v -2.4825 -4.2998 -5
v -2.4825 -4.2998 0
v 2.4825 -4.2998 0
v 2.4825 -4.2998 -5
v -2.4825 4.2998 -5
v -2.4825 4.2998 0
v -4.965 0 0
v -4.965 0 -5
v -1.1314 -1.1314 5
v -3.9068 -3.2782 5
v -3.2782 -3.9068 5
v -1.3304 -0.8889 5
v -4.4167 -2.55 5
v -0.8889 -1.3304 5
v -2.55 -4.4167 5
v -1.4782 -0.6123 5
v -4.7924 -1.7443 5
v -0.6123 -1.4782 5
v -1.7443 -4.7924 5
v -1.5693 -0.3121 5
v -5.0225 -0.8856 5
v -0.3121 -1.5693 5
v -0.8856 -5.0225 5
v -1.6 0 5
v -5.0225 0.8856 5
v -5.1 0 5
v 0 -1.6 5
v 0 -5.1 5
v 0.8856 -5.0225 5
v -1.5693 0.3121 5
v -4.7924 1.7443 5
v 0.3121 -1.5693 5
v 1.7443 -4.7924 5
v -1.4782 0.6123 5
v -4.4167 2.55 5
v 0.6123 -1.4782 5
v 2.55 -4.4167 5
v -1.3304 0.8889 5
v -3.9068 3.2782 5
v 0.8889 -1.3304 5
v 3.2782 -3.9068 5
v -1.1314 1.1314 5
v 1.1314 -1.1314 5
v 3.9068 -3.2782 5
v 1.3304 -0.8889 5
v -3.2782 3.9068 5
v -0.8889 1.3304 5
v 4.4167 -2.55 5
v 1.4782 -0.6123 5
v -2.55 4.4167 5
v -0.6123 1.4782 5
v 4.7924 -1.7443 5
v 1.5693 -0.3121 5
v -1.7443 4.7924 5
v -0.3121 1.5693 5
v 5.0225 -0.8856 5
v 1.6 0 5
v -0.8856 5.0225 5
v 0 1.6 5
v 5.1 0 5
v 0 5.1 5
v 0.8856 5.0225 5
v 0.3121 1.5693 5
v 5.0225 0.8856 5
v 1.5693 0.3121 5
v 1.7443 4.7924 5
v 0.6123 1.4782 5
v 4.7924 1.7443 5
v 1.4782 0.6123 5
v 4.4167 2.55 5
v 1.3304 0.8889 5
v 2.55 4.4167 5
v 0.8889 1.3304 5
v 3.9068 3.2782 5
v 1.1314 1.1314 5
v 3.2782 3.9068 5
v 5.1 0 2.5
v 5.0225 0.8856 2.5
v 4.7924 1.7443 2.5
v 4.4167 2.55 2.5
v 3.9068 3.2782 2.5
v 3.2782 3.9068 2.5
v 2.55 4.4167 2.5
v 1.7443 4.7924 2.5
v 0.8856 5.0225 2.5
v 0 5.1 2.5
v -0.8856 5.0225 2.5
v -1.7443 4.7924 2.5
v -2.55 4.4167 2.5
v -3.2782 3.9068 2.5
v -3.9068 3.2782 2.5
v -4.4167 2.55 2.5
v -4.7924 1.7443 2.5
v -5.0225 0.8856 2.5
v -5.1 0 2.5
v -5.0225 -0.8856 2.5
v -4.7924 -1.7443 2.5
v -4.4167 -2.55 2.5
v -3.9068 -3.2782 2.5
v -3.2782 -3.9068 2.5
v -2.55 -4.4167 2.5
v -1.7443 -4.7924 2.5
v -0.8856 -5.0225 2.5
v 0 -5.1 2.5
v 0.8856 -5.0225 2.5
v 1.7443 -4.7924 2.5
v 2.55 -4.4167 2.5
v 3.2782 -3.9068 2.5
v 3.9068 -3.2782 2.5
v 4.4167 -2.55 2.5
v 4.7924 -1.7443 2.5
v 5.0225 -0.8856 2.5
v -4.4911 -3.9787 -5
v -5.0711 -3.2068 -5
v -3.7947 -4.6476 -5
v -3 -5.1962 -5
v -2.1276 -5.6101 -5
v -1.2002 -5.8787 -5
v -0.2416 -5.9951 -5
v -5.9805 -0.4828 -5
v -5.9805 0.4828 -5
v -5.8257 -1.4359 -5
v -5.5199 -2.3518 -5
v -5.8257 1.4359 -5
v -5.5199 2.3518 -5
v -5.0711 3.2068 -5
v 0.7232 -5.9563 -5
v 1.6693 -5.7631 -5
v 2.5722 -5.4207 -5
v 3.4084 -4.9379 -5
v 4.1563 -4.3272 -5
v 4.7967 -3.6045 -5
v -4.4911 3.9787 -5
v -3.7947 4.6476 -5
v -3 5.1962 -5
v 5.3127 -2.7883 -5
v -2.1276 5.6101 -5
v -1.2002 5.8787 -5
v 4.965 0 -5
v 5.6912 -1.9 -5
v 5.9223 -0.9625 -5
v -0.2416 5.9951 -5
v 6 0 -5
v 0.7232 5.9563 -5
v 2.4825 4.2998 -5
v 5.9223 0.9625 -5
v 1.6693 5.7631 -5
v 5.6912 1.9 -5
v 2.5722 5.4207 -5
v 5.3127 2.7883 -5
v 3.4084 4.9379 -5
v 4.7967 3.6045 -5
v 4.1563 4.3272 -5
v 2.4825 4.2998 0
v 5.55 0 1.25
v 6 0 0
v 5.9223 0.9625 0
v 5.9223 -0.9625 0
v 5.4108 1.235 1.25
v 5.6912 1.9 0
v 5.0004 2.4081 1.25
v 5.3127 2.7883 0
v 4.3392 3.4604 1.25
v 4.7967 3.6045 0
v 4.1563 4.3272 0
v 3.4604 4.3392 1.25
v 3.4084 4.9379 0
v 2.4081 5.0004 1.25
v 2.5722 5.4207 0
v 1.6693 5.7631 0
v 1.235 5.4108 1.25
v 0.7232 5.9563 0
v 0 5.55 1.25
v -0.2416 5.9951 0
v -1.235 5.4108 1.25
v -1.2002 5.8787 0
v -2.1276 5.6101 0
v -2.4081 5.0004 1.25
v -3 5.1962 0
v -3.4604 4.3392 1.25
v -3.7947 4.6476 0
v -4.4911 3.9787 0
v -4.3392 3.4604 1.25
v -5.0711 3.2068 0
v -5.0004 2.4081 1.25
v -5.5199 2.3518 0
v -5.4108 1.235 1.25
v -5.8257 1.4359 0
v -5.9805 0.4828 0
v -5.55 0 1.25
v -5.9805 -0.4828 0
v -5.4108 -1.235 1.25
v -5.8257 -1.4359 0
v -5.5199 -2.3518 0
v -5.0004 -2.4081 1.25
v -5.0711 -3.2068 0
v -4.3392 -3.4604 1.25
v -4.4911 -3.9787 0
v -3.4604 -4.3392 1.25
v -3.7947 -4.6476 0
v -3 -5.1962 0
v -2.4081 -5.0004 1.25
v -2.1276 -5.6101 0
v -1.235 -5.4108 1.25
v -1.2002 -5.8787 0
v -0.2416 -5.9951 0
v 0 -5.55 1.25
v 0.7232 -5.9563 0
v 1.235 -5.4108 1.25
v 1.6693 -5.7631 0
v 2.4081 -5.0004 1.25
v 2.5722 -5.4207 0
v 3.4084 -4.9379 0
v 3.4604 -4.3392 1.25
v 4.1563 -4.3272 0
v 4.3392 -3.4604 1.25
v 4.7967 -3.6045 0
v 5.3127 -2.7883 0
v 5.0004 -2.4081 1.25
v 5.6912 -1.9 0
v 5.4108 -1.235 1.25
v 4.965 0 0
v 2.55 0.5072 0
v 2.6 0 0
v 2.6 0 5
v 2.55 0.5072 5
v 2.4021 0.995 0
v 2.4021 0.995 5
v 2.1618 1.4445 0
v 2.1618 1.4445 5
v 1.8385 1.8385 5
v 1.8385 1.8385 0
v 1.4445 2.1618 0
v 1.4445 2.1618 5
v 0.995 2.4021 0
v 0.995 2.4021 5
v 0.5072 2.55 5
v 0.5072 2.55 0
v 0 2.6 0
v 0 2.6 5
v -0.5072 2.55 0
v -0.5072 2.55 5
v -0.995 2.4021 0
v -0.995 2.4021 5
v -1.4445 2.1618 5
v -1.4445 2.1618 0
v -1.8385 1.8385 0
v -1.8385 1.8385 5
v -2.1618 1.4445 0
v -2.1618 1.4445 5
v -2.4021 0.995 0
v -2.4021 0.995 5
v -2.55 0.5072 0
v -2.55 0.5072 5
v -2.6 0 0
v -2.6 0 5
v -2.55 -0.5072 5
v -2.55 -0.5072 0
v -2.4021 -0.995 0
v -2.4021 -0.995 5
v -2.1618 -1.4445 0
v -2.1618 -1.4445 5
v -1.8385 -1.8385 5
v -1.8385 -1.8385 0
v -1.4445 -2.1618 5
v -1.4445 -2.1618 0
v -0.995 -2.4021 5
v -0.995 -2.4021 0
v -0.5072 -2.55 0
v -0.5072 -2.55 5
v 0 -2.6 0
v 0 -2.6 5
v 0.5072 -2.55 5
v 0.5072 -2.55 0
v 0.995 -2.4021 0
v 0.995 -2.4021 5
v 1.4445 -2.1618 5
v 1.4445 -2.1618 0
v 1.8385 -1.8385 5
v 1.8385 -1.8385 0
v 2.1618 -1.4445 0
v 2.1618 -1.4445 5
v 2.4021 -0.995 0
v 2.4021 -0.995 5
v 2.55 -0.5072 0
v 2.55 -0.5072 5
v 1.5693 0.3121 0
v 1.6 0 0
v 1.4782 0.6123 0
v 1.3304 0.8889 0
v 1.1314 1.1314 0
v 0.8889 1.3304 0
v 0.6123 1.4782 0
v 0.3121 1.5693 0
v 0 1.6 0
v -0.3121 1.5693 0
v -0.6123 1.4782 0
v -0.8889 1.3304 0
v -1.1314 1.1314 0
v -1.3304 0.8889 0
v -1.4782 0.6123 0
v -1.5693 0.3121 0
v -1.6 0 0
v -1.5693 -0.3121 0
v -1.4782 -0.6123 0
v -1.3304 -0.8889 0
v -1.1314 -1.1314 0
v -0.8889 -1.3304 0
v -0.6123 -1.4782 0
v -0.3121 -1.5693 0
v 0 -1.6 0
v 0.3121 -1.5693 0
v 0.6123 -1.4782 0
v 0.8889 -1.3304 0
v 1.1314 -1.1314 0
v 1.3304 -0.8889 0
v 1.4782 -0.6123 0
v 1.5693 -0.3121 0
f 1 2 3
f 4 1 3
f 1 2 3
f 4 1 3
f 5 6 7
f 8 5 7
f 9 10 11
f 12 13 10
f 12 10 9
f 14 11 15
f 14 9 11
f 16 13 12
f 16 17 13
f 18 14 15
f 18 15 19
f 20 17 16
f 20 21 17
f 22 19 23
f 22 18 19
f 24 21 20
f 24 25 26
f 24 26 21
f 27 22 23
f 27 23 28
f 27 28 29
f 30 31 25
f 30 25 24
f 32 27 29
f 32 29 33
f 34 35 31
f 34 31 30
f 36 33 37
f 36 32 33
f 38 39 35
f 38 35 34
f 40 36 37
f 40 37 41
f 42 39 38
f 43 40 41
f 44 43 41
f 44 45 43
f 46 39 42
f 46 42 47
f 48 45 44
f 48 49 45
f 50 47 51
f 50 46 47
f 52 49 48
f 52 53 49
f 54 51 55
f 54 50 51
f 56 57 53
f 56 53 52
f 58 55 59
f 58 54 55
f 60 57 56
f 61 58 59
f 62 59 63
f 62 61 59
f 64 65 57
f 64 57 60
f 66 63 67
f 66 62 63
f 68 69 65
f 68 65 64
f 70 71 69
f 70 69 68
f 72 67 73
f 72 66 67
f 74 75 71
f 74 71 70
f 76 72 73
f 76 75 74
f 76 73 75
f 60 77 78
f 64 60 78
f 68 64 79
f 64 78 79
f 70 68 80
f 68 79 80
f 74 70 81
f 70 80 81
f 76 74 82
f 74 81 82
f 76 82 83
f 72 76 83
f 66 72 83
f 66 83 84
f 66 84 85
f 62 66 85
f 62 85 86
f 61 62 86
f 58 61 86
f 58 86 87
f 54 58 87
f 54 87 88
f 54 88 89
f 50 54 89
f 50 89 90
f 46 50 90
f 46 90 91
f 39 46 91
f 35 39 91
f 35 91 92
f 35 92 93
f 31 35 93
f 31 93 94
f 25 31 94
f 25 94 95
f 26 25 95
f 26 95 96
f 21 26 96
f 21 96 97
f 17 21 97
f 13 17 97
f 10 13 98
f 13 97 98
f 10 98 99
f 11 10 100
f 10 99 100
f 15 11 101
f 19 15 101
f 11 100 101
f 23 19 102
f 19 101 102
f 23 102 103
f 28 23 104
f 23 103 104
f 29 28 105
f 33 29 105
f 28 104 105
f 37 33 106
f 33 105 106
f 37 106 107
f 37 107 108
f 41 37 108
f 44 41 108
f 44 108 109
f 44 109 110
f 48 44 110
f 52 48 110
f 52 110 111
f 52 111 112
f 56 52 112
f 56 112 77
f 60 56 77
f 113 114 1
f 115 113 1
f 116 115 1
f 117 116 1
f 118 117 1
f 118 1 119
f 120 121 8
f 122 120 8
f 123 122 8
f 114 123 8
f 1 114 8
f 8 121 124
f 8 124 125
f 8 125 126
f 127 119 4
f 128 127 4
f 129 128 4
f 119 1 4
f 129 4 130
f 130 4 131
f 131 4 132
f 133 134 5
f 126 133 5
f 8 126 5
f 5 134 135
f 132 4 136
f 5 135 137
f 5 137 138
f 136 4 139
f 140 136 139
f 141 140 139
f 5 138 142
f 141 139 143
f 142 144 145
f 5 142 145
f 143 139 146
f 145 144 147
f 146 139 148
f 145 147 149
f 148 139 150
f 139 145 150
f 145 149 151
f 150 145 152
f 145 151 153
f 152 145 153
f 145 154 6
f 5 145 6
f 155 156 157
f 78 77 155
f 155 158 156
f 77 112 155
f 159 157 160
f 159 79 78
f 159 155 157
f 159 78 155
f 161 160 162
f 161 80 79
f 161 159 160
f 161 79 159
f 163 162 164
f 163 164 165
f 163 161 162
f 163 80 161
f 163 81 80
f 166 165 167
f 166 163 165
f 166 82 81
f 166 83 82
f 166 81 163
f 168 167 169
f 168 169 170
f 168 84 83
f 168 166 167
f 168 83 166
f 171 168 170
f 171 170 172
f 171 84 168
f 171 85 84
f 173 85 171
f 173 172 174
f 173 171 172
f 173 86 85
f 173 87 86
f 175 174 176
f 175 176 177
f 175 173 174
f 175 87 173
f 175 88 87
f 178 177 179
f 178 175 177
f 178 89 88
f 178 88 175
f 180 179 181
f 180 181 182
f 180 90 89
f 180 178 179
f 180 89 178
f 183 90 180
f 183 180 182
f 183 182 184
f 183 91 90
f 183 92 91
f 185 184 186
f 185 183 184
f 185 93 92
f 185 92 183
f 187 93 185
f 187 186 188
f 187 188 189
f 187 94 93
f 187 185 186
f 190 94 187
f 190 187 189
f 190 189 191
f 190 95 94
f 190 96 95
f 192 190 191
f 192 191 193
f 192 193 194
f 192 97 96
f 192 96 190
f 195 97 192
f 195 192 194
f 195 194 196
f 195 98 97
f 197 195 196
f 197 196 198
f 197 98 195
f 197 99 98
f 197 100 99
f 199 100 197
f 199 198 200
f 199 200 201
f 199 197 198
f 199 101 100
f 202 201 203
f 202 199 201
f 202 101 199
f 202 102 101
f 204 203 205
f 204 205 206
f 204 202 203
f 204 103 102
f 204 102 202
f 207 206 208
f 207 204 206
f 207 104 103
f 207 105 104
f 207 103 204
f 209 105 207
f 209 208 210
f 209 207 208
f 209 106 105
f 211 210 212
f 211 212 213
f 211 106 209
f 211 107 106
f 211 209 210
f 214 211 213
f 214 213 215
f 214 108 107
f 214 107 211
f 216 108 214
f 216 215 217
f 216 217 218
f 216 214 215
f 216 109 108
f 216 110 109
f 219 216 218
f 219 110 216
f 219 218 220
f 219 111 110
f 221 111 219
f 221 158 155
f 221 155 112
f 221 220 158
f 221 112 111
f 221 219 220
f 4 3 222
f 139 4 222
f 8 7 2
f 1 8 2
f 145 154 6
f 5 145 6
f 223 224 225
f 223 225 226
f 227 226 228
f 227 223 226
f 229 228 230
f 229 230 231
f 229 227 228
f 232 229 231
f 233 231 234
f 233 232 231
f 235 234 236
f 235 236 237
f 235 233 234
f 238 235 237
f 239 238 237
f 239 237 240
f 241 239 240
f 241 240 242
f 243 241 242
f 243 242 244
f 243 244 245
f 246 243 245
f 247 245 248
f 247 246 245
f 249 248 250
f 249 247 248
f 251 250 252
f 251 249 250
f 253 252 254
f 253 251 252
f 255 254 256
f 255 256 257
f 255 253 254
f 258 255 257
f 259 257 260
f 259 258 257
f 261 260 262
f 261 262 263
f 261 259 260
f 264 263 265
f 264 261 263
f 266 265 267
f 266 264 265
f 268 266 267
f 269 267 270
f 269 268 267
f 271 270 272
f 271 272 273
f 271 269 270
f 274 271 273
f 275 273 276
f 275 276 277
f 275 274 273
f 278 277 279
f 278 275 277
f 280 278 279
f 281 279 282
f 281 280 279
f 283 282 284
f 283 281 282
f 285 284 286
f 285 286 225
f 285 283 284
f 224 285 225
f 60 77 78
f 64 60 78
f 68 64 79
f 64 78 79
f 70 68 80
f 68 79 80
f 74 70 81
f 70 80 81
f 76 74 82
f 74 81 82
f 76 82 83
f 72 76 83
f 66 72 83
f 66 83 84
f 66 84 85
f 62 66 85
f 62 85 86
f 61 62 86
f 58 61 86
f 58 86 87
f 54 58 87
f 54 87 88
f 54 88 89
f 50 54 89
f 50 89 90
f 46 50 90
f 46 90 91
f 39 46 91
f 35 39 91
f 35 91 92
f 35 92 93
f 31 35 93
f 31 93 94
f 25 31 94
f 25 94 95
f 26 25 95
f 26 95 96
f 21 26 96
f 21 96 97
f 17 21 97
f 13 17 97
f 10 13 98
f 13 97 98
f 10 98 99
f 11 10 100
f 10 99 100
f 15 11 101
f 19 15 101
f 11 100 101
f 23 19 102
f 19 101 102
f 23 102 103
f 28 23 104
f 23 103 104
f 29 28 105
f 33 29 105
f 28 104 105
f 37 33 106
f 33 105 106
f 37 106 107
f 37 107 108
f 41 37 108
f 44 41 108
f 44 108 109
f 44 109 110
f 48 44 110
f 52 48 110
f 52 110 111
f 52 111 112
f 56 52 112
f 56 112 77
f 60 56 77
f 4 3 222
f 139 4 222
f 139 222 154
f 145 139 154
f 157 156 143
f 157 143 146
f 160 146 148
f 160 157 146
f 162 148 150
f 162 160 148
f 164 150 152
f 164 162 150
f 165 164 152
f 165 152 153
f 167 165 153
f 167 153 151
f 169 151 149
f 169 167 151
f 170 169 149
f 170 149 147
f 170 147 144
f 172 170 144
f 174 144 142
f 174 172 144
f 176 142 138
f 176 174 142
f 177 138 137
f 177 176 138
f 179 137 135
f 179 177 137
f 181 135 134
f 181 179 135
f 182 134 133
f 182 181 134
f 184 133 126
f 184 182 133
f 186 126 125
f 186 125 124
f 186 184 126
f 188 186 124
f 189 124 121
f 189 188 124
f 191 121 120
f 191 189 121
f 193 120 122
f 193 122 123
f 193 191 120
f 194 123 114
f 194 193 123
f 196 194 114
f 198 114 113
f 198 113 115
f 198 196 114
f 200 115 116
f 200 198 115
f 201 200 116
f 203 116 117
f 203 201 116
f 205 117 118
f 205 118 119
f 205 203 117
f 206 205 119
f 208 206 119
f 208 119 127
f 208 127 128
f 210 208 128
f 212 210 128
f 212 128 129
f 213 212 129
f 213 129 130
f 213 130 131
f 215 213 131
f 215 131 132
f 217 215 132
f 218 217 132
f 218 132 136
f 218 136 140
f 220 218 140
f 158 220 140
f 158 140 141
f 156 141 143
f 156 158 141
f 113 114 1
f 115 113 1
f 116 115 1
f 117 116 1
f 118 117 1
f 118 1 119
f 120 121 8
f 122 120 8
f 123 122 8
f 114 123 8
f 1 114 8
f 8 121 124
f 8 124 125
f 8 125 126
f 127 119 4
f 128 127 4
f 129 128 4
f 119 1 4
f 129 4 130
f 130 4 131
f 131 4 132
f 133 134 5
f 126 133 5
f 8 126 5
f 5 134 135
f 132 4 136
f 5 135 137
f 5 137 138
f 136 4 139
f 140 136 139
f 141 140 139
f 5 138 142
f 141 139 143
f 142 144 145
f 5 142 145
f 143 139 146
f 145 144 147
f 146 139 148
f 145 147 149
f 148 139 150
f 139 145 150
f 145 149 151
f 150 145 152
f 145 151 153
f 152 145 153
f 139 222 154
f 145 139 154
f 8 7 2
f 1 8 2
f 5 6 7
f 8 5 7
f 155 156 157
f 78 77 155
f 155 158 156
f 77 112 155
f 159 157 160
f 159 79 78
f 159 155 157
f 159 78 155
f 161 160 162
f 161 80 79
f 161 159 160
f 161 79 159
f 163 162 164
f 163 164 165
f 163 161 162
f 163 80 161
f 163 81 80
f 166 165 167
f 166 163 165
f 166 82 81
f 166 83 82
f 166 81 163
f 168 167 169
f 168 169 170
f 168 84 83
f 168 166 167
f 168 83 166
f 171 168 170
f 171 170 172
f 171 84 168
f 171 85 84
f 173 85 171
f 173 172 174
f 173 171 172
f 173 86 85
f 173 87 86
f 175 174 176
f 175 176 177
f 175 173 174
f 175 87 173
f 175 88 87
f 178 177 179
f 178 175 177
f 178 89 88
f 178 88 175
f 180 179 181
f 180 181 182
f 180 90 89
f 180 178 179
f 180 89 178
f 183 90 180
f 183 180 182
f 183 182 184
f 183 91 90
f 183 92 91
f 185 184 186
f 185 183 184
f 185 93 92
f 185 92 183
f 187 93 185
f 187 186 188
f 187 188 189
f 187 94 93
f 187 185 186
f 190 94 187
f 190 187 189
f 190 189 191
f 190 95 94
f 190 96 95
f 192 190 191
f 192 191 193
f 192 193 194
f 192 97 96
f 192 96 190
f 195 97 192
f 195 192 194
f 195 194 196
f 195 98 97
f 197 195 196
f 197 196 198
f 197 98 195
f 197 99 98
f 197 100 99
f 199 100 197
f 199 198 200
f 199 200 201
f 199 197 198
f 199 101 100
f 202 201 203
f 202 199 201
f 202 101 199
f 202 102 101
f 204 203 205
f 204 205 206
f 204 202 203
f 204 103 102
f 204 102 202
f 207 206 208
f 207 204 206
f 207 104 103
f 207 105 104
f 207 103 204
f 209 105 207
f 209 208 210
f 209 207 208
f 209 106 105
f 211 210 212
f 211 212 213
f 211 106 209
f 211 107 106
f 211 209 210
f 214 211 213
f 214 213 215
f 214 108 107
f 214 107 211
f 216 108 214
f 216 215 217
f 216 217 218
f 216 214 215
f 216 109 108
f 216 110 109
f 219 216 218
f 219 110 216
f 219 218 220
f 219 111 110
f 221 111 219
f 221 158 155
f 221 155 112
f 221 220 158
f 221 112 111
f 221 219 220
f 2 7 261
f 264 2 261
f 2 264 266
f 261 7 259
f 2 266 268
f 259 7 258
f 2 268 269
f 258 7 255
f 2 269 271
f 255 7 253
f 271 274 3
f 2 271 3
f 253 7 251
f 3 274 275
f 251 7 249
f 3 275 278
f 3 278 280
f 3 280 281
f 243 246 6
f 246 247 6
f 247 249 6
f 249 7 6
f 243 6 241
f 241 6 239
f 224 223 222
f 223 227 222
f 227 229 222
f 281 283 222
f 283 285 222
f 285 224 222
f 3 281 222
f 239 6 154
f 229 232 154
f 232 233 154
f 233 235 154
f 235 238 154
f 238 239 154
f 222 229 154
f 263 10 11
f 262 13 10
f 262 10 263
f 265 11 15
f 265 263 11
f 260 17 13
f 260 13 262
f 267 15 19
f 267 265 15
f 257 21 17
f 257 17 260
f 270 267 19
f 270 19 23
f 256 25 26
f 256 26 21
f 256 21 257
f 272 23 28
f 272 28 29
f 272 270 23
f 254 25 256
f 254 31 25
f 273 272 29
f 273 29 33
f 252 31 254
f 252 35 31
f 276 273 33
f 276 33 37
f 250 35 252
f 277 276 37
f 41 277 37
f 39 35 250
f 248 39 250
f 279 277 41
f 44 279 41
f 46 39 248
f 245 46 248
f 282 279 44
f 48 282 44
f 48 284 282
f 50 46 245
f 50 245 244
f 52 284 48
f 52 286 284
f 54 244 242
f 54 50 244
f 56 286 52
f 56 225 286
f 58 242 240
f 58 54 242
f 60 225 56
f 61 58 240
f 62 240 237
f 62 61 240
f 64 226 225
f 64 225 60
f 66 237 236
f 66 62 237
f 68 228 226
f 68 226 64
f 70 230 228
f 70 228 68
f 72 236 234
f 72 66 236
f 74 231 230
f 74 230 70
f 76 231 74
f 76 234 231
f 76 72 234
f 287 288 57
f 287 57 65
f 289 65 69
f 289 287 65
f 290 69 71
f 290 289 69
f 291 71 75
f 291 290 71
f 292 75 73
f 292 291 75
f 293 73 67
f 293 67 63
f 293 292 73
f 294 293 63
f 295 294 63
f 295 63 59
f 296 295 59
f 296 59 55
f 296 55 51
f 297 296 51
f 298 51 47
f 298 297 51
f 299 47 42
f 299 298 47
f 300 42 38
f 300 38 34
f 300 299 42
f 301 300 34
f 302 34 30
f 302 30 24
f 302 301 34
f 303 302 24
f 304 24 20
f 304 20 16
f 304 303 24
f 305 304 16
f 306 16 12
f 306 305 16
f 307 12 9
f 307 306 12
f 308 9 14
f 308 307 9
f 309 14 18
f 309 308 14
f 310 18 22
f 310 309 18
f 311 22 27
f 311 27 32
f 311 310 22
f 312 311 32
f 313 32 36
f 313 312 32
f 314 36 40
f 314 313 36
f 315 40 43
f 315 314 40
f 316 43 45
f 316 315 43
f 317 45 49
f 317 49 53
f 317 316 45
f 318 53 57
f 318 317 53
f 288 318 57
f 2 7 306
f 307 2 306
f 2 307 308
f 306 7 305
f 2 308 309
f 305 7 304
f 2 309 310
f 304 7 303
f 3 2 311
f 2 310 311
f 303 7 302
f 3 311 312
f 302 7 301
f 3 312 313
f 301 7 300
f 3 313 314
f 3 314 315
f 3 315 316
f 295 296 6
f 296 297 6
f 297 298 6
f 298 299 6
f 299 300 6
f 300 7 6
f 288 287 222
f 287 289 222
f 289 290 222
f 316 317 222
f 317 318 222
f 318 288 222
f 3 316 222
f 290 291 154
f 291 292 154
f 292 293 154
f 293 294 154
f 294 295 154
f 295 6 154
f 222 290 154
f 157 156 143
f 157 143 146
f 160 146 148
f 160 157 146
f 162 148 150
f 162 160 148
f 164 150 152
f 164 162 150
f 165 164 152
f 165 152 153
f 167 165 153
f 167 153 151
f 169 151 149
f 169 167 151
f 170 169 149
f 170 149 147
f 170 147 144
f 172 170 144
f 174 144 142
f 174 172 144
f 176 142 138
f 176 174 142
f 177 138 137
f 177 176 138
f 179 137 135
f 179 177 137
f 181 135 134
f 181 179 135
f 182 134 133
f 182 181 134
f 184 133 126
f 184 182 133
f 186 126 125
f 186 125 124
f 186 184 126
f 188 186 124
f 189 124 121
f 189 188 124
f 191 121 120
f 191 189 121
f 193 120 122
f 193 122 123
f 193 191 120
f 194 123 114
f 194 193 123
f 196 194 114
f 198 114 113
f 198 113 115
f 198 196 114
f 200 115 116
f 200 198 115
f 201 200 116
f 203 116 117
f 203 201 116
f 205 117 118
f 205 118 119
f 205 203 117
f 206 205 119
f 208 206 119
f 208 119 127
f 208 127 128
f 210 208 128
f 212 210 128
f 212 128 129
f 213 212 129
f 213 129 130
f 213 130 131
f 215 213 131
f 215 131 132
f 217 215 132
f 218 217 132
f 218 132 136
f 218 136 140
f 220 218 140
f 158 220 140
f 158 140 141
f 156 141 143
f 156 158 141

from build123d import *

# Parameters (mm, degrees)
SKETCH_R      = 5.1
SKETCH_R_2    = 1.6
PAD_DEPTH     = 5
SKETCH001_R   = 6
PAD001_DEPTH  = 5
SKETCH003_R   = 5.1
SKETCH003_R_2 = 2.6
PAD002_DEPTH  = 5
SKETCH004_R   = 6
PAD003_DEPTH  = 5


with BuildPart() as body:
    # Sketch → Pad (new body)
    with BuildSketch(Plane.XY):
        Circle(SKETCH_R)
        Circle(SKETCH_R_2, mode=Mode.SUBTRACT)
    extrude(amount=PAD_DEPTH)

    # Sketch001 → Pad001 (join)
    with BuildSketch(Plane.XY):
        Circle(SKETCH001_R)
        Polygon((2.4825, 4.299816), (-2.4825, 4.299816), (-4.965, 0), (-2.4825, -4.299816), (2.4825, -4.299816), (4.965, 0), align=None, mode=Mode.SUBTRACT)
    extrude(amount=-PAD001_DEPTH)

    # Sketch002 → Revolution (revolve)
    with BuildSketch(Plane.XZ):
        Polygon((6, 0), (5.1, 2.5), (5.1, 0), align=None)
    revolve(axis=Axis((0, 0, 0), (0, 0, 1)))


with BuildPart() as body001:
    # Sketch003 → Pad002 (new body)
    with BuildSketch(Plane.XY):
        Circle(SKETCH003_R)
        Circle(SKETCH003_R_2, mode=Mode.SUBTRACT)
    extrude(amount=PAD002_DEPTH)

    # Sketch004 → Pad003 (join)
    with BuildSketch(Plane.XY):
        Circle(SKETCH004_R)
        Polygon((2.4825, 4.299816), (-2.4825, 4.299816), (-4.965, 0), (-2.4825, -4.299816), (2.4825, -4.299816), (4.965, 0), align=None, mode=Mode.SUBTRACT)
    extrude(amount=-PAD003_DEPTH)

    # Sketch005 → Revolution001 (revolve)
    with BuildSketch(Plane.XZ):
        Polygon((6, 0), (5.1, 2.5), (5.1, 0), align=None)
    revolve(axis=Axis((0, 0, 0), (0, 0, 1)))


solid = Compound([body.part, body001.part])
